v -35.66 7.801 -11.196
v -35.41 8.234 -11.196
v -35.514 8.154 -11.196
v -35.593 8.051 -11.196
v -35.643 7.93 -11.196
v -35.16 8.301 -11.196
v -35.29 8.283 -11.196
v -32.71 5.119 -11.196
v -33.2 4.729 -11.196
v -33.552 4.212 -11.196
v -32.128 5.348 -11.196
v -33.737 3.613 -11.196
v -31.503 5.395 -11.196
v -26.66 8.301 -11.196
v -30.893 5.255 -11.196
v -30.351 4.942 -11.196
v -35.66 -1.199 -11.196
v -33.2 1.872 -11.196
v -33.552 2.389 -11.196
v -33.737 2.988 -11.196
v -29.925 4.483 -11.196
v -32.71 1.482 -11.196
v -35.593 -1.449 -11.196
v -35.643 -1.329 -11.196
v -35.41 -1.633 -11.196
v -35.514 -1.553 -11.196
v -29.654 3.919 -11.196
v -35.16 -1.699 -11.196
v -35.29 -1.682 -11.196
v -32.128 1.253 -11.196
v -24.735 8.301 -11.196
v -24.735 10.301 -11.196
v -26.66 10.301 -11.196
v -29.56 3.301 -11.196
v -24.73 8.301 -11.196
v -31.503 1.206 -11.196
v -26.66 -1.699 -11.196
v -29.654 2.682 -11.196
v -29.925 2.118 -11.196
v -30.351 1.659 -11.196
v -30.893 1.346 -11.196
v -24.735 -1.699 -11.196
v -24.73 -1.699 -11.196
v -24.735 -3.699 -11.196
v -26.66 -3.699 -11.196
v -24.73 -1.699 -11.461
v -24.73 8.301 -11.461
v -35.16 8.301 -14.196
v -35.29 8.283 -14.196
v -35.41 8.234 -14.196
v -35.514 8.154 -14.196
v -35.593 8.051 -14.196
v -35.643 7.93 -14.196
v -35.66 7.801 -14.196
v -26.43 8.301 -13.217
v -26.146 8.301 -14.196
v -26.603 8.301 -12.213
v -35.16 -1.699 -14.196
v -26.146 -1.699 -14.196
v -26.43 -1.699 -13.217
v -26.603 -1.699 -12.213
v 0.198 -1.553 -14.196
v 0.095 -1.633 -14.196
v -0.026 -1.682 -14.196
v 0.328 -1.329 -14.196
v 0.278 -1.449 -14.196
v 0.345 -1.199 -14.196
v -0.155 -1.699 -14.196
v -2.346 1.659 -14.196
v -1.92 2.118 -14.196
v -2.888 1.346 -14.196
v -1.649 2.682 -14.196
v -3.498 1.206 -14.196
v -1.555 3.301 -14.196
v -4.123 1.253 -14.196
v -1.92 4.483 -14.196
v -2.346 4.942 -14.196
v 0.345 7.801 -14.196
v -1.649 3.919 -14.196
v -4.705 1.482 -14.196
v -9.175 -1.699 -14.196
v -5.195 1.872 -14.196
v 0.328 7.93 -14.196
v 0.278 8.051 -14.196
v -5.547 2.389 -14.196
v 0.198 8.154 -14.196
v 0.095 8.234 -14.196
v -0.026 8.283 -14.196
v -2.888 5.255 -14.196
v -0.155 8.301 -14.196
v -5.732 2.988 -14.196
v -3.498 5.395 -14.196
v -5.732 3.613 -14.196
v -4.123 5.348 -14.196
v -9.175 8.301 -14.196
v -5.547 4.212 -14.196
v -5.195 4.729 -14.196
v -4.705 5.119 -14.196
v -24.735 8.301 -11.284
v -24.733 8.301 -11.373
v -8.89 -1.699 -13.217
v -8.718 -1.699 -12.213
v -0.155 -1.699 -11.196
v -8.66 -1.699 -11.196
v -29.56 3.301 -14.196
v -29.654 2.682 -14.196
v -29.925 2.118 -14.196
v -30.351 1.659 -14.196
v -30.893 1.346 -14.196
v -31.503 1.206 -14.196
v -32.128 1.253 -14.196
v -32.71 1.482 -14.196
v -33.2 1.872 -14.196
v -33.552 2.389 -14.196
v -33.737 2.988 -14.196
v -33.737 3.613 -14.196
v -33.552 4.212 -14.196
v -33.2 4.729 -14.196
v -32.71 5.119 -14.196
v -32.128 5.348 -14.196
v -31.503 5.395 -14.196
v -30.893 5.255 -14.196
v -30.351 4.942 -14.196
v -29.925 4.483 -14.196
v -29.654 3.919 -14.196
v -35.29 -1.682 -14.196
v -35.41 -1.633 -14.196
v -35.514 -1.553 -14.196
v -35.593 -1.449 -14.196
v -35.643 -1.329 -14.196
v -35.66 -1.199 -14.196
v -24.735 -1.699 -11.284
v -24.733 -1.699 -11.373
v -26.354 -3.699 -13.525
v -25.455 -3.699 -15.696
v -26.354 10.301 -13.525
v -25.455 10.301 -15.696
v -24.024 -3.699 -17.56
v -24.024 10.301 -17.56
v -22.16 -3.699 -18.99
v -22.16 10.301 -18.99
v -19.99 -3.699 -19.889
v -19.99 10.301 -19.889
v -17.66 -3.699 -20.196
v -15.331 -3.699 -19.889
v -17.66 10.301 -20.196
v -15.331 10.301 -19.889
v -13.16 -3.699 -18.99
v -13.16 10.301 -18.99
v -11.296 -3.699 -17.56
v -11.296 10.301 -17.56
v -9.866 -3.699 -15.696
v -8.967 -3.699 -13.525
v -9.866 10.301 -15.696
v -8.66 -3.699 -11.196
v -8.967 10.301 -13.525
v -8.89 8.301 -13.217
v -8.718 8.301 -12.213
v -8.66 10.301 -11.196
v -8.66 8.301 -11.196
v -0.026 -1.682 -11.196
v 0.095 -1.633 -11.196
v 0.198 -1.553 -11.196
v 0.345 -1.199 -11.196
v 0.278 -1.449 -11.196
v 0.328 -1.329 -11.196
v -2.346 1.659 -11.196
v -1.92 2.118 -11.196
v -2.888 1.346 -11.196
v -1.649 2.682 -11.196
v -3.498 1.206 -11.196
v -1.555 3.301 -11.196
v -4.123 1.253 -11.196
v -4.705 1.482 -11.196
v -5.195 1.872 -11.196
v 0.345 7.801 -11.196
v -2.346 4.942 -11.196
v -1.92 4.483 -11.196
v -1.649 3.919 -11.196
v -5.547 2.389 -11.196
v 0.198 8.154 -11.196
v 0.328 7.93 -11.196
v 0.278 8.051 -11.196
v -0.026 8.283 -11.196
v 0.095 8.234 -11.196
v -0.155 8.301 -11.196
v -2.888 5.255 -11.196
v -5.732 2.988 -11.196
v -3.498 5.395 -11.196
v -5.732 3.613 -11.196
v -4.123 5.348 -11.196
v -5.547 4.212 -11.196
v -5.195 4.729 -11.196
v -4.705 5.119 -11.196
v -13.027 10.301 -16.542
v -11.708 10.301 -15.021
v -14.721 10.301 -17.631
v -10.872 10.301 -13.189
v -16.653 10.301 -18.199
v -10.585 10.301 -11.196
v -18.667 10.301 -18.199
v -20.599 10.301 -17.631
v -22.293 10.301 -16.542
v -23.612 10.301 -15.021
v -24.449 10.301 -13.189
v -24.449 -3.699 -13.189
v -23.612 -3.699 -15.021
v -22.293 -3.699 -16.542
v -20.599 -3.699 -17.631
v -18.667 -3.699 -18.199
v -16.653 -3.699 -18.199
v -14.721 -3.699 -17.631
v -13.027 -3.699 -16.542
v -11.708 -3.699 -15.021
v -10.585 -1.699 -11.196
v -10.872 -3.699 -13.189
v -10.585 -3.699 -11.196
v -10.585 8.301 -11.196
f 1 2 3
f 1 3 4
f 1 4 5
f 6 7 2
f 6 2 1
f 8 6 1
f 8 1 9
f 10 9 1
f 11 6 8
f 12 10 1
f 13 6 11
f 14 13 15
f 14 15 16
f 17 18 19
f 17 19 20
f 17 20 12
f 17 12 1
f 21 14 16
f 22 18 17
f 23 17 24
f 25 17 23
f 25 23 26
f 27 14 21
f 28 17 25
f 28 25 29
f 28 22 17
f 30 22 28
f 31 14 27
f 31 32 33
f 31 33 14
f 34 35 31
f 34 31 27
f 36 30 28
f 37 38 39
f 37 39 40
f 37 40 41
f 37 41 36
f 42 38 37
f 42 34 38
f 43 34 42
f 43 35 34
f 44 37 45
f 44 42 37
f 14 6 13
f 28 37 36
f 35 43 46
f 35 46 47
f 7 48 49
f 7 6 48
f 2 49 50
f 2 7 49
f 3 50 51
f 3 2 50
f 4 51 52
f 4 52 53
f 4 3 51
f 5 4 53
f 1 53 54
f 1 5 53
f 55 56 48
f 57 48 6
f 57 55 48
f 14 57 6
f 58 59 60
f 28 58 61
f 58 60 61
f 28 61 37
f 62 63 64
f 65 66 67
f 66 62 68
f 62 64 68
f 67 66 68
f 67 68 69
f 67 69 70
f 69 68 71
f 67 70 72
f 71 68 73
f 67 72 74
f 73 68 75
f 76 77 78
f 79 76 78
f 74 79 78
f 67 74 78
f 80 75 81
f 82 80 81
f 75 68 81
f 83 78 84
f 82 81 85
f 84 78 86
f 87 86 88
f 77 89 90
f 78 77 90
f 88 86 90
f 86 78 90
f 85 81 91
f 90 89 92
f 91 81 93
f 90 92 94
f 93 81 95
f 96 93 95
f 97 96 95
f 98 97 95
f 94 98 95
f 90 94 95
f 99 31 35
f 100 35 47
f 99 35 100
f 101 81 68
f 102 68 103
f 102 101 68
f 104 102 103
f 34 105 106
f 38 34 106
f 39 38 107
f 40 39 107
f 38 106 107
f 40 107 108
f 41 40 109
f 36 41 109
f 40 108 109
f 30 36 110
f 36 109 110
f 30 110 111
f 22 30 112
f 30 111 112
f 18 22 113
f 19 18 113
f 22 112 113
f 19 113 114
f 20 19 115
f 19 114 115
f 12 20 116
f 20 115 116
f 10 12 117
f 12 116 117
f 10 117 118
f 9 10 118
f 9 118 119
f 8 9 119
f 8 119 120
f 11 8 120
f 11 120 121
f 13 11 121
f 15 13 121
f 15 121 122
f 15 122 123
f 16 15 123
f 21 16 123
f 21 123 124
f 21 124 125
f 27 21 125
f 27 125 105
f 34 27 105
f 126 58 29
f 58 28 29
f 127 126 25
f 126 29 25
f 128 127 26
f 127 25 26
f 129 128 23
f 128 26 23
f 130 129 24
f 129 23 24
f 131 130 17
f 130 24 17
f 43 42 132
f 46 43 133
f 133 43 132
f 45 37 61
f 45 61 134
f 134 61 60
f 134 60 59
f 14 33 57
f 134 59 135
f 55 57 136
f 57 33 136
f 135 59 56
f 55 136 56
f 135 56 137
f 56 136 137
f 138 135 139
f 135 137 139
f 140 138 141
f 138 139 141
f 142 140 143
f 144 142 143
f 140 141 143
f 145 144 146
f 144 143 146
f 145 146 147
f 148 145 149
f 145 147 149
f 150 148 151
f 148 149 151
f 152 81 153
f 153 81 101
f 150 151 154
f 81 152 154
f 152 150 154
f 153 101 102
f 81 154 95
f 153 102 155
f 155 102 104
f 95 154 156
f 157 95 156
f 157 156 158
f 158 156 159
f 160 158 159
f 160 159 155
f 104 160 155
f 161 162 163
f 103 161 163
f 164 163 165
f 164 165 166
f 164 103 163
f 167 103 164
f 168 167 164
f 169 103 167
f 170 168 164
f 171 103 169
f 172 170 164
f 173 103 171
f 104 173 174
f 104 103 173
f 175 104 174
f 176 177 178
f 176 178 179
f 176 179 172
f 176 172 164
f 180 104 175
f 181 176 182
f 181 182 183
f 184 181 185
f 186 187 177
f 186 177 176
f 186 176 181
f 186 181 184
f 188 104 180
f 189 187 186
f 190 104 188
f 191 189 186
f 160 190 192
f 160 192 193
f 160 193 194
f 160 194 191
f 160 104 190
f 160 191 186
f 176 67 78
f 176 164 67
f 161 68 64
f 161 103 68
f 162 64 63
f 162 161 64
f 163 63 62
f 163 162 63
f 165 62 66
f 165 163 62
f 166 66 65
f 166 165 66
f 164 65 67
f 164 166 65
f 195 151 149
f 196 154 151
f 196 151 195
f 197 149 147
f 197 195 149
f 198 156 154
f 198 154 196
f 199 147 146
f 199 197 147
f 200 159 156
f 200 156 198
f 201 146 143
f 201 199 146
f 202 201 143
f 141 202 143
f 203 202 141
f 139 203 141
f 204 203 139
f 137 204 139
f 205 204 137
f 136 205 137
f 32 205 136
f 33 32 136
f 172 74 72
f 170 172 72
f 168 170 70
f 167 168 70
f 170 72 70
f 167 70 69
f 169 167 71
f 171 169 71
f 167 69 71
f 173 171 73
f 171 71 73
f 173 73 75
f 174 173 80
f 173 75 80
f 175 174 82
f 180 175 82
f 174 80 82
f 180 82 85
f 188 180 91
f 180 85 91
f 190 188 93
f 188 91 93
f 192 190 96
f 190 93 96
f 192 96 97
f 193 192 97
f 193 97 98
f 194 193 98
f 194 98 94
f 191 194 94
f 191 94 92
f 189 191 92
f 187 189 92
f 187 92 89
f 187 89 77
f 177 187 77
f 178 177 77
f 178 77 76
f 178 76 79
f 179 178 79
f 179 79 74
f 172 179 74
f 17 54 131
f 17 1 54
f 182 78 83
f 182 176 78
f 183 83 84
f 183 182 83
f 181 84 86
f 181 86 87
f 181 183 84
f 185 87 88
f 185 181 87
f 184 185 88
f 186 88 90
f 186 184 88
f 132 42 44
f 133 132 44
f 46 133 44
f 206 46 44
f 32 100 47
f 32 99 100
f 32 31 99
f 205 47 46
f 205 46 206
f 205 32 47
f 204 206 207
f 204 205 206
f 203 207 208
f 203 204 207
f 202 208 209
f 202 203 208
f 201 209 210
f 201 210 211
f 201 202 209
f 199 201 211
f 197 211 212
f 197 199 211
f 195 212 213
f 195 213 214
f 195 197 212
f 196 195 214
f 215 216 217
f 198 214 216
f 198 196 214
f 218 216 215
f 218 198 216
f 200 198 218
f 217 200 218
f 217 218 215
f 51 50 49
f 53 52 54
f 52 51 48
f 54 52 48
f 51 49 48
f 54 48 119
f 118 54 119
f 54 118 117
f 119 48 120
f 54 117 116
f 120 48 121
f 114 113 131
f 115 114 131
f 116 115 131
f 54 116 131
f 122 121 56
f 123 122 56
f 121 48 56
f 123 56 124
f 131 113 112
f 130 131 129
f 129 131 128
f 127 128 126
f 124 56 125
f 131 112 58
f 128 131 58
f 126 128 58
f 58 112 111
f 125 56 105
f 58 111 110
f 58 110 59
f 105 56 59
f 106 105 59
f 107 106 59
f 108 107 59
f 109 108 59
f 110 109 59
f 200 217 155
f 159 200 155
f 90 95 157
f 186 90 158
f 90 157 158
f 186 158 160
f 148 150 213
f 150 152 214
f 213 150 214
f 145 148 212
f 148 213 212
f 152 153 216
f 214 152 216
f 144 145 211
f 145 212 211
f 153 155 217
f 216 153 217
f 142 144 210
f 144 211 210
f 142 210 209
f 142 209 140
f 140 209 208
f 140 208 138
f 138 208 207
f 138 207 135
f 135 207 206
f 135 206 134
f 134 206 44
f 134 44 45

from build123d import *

# Parameters (mm, degrees)
PAD037_DEPTH      = 13
PAD037_DEPTH_BACK = 1
SKETCH058_W       = 1.93
SKETCH058_H       = 10
PAD038_DEPTH      = 3
SKETCH059_W       = 10
SKETCH059_H       = 3
PAD039_DEPTH      = 9
SKETCH060_W       = 10
SKETCH060_H       = 3
PAD040_DEPTH      = 9
SKETCH070_R       = 2.1
HOLE_DEPTH        = 3.001
FILLET014_R       = 0.5


with BuildPart() as part:
    # Sketch057 (on Face1 of CopyPad023) → Pad037 (new body, two sides)
    with BuildSketch(Plane(origin=(0, -35.363644, -2), x_dir=(1, 0, 0), z_dir=(0, -1, 0))) as pad037_sk:
        with BuildLine():
            ThreePointArc((-25.035308, -10.895555), (-17.960308, -17.970555), (-10.885308, -10.895554))
            Line((-10.885308, -10.895554), (-8.960308, -10.895554))
            ThreePointArc((-26.960308, -10.895555), (-17.960308, -19.895555), (-8.960308, -10.895554))
            Line((-26.960308, -10.895555), (-25.035308, -10.895555))
        make_face()
    extrude(amount=-PAD037_DEPTH)
    extrude(pad037_sk.sketch, amount=PAD037_DEPTH_BACK)

    # Sketch058 (on Face1 of Pad037) → Pad038 (join)
    with BuildSketch(Plane.XY.offset(-12.895555)):
        with Locations((-25.995308, -29.363644)):
            Rectangle(SKETCH058_W, SKETCH058_H)
        with Locations((-9.920308, -29.363644)):
            Rectangle(SKETCH058_W, SKETCH058_H)
    extrude(amount=-PAD038_DEPTH)

    # Sketch059 (on Face12 of Pad038) → Pad039 (join)
    with BuildSketch(Plane(origin=(-26.960308, 0, -2), x_dir=(0, -1, 0), z_dir=(-1, 0, 0))):
        with Locations((29.363644, -12.395555)):
            Rectangle(SKETCH059_W, SKETCH059_H)
    extrude(amount=PAD039_DEPTH)

    # Sketch060 (on Face13 of Pad039) → Pad040 (join)
    with BuildSketch(Plane(origin=(-8.955308, 0, -2), x_dir=(0, 1, 0), z_dir=(1, 0, 0))):
        with Locations((-29.363644, -12.395555)):
            Rectangle(SKETCH060_W, SKETCH060_H)
    extrude(amount=PAD040_DEPTH)

    # Sketch070 (on Face15 of Pad040) → Hole (cut, through all)
    with BuildSketch(Plane(origin=(0, 0, -15.895555), x_dir=(1, 0, 0), z_dir=(0, 0, -1))):
        with Locations((-31.960308, 29.363644)):
            Circle(SKETCH070_R)
        with Locations((-3.955308, 29.363644)):
            Circle(SKETCH070_R)
    extrude(amount=-HOLE_DEPTH, mode=Mode.SUBTRACT)

    # Fillet014
    fillet014_edges = [part.edges().sort_by_distance(p)[0] for p in [
        (-35.960308, -24.363644, -14.395555),
        (-35.960308, -34.363644, -14.395555),
        (0.044692, -24.363644, -14.395555),
        (0.044692, -34.363644, -14.395555),
    ]]
    fillet(fillet014_edges, radius=FILLET014_R)


with BuildPart() as part_1:
    # Body007 placement: moved
    add(part.part.moved(Location((0.3, 32.66415, 1.7))))


solid = part_1.part
